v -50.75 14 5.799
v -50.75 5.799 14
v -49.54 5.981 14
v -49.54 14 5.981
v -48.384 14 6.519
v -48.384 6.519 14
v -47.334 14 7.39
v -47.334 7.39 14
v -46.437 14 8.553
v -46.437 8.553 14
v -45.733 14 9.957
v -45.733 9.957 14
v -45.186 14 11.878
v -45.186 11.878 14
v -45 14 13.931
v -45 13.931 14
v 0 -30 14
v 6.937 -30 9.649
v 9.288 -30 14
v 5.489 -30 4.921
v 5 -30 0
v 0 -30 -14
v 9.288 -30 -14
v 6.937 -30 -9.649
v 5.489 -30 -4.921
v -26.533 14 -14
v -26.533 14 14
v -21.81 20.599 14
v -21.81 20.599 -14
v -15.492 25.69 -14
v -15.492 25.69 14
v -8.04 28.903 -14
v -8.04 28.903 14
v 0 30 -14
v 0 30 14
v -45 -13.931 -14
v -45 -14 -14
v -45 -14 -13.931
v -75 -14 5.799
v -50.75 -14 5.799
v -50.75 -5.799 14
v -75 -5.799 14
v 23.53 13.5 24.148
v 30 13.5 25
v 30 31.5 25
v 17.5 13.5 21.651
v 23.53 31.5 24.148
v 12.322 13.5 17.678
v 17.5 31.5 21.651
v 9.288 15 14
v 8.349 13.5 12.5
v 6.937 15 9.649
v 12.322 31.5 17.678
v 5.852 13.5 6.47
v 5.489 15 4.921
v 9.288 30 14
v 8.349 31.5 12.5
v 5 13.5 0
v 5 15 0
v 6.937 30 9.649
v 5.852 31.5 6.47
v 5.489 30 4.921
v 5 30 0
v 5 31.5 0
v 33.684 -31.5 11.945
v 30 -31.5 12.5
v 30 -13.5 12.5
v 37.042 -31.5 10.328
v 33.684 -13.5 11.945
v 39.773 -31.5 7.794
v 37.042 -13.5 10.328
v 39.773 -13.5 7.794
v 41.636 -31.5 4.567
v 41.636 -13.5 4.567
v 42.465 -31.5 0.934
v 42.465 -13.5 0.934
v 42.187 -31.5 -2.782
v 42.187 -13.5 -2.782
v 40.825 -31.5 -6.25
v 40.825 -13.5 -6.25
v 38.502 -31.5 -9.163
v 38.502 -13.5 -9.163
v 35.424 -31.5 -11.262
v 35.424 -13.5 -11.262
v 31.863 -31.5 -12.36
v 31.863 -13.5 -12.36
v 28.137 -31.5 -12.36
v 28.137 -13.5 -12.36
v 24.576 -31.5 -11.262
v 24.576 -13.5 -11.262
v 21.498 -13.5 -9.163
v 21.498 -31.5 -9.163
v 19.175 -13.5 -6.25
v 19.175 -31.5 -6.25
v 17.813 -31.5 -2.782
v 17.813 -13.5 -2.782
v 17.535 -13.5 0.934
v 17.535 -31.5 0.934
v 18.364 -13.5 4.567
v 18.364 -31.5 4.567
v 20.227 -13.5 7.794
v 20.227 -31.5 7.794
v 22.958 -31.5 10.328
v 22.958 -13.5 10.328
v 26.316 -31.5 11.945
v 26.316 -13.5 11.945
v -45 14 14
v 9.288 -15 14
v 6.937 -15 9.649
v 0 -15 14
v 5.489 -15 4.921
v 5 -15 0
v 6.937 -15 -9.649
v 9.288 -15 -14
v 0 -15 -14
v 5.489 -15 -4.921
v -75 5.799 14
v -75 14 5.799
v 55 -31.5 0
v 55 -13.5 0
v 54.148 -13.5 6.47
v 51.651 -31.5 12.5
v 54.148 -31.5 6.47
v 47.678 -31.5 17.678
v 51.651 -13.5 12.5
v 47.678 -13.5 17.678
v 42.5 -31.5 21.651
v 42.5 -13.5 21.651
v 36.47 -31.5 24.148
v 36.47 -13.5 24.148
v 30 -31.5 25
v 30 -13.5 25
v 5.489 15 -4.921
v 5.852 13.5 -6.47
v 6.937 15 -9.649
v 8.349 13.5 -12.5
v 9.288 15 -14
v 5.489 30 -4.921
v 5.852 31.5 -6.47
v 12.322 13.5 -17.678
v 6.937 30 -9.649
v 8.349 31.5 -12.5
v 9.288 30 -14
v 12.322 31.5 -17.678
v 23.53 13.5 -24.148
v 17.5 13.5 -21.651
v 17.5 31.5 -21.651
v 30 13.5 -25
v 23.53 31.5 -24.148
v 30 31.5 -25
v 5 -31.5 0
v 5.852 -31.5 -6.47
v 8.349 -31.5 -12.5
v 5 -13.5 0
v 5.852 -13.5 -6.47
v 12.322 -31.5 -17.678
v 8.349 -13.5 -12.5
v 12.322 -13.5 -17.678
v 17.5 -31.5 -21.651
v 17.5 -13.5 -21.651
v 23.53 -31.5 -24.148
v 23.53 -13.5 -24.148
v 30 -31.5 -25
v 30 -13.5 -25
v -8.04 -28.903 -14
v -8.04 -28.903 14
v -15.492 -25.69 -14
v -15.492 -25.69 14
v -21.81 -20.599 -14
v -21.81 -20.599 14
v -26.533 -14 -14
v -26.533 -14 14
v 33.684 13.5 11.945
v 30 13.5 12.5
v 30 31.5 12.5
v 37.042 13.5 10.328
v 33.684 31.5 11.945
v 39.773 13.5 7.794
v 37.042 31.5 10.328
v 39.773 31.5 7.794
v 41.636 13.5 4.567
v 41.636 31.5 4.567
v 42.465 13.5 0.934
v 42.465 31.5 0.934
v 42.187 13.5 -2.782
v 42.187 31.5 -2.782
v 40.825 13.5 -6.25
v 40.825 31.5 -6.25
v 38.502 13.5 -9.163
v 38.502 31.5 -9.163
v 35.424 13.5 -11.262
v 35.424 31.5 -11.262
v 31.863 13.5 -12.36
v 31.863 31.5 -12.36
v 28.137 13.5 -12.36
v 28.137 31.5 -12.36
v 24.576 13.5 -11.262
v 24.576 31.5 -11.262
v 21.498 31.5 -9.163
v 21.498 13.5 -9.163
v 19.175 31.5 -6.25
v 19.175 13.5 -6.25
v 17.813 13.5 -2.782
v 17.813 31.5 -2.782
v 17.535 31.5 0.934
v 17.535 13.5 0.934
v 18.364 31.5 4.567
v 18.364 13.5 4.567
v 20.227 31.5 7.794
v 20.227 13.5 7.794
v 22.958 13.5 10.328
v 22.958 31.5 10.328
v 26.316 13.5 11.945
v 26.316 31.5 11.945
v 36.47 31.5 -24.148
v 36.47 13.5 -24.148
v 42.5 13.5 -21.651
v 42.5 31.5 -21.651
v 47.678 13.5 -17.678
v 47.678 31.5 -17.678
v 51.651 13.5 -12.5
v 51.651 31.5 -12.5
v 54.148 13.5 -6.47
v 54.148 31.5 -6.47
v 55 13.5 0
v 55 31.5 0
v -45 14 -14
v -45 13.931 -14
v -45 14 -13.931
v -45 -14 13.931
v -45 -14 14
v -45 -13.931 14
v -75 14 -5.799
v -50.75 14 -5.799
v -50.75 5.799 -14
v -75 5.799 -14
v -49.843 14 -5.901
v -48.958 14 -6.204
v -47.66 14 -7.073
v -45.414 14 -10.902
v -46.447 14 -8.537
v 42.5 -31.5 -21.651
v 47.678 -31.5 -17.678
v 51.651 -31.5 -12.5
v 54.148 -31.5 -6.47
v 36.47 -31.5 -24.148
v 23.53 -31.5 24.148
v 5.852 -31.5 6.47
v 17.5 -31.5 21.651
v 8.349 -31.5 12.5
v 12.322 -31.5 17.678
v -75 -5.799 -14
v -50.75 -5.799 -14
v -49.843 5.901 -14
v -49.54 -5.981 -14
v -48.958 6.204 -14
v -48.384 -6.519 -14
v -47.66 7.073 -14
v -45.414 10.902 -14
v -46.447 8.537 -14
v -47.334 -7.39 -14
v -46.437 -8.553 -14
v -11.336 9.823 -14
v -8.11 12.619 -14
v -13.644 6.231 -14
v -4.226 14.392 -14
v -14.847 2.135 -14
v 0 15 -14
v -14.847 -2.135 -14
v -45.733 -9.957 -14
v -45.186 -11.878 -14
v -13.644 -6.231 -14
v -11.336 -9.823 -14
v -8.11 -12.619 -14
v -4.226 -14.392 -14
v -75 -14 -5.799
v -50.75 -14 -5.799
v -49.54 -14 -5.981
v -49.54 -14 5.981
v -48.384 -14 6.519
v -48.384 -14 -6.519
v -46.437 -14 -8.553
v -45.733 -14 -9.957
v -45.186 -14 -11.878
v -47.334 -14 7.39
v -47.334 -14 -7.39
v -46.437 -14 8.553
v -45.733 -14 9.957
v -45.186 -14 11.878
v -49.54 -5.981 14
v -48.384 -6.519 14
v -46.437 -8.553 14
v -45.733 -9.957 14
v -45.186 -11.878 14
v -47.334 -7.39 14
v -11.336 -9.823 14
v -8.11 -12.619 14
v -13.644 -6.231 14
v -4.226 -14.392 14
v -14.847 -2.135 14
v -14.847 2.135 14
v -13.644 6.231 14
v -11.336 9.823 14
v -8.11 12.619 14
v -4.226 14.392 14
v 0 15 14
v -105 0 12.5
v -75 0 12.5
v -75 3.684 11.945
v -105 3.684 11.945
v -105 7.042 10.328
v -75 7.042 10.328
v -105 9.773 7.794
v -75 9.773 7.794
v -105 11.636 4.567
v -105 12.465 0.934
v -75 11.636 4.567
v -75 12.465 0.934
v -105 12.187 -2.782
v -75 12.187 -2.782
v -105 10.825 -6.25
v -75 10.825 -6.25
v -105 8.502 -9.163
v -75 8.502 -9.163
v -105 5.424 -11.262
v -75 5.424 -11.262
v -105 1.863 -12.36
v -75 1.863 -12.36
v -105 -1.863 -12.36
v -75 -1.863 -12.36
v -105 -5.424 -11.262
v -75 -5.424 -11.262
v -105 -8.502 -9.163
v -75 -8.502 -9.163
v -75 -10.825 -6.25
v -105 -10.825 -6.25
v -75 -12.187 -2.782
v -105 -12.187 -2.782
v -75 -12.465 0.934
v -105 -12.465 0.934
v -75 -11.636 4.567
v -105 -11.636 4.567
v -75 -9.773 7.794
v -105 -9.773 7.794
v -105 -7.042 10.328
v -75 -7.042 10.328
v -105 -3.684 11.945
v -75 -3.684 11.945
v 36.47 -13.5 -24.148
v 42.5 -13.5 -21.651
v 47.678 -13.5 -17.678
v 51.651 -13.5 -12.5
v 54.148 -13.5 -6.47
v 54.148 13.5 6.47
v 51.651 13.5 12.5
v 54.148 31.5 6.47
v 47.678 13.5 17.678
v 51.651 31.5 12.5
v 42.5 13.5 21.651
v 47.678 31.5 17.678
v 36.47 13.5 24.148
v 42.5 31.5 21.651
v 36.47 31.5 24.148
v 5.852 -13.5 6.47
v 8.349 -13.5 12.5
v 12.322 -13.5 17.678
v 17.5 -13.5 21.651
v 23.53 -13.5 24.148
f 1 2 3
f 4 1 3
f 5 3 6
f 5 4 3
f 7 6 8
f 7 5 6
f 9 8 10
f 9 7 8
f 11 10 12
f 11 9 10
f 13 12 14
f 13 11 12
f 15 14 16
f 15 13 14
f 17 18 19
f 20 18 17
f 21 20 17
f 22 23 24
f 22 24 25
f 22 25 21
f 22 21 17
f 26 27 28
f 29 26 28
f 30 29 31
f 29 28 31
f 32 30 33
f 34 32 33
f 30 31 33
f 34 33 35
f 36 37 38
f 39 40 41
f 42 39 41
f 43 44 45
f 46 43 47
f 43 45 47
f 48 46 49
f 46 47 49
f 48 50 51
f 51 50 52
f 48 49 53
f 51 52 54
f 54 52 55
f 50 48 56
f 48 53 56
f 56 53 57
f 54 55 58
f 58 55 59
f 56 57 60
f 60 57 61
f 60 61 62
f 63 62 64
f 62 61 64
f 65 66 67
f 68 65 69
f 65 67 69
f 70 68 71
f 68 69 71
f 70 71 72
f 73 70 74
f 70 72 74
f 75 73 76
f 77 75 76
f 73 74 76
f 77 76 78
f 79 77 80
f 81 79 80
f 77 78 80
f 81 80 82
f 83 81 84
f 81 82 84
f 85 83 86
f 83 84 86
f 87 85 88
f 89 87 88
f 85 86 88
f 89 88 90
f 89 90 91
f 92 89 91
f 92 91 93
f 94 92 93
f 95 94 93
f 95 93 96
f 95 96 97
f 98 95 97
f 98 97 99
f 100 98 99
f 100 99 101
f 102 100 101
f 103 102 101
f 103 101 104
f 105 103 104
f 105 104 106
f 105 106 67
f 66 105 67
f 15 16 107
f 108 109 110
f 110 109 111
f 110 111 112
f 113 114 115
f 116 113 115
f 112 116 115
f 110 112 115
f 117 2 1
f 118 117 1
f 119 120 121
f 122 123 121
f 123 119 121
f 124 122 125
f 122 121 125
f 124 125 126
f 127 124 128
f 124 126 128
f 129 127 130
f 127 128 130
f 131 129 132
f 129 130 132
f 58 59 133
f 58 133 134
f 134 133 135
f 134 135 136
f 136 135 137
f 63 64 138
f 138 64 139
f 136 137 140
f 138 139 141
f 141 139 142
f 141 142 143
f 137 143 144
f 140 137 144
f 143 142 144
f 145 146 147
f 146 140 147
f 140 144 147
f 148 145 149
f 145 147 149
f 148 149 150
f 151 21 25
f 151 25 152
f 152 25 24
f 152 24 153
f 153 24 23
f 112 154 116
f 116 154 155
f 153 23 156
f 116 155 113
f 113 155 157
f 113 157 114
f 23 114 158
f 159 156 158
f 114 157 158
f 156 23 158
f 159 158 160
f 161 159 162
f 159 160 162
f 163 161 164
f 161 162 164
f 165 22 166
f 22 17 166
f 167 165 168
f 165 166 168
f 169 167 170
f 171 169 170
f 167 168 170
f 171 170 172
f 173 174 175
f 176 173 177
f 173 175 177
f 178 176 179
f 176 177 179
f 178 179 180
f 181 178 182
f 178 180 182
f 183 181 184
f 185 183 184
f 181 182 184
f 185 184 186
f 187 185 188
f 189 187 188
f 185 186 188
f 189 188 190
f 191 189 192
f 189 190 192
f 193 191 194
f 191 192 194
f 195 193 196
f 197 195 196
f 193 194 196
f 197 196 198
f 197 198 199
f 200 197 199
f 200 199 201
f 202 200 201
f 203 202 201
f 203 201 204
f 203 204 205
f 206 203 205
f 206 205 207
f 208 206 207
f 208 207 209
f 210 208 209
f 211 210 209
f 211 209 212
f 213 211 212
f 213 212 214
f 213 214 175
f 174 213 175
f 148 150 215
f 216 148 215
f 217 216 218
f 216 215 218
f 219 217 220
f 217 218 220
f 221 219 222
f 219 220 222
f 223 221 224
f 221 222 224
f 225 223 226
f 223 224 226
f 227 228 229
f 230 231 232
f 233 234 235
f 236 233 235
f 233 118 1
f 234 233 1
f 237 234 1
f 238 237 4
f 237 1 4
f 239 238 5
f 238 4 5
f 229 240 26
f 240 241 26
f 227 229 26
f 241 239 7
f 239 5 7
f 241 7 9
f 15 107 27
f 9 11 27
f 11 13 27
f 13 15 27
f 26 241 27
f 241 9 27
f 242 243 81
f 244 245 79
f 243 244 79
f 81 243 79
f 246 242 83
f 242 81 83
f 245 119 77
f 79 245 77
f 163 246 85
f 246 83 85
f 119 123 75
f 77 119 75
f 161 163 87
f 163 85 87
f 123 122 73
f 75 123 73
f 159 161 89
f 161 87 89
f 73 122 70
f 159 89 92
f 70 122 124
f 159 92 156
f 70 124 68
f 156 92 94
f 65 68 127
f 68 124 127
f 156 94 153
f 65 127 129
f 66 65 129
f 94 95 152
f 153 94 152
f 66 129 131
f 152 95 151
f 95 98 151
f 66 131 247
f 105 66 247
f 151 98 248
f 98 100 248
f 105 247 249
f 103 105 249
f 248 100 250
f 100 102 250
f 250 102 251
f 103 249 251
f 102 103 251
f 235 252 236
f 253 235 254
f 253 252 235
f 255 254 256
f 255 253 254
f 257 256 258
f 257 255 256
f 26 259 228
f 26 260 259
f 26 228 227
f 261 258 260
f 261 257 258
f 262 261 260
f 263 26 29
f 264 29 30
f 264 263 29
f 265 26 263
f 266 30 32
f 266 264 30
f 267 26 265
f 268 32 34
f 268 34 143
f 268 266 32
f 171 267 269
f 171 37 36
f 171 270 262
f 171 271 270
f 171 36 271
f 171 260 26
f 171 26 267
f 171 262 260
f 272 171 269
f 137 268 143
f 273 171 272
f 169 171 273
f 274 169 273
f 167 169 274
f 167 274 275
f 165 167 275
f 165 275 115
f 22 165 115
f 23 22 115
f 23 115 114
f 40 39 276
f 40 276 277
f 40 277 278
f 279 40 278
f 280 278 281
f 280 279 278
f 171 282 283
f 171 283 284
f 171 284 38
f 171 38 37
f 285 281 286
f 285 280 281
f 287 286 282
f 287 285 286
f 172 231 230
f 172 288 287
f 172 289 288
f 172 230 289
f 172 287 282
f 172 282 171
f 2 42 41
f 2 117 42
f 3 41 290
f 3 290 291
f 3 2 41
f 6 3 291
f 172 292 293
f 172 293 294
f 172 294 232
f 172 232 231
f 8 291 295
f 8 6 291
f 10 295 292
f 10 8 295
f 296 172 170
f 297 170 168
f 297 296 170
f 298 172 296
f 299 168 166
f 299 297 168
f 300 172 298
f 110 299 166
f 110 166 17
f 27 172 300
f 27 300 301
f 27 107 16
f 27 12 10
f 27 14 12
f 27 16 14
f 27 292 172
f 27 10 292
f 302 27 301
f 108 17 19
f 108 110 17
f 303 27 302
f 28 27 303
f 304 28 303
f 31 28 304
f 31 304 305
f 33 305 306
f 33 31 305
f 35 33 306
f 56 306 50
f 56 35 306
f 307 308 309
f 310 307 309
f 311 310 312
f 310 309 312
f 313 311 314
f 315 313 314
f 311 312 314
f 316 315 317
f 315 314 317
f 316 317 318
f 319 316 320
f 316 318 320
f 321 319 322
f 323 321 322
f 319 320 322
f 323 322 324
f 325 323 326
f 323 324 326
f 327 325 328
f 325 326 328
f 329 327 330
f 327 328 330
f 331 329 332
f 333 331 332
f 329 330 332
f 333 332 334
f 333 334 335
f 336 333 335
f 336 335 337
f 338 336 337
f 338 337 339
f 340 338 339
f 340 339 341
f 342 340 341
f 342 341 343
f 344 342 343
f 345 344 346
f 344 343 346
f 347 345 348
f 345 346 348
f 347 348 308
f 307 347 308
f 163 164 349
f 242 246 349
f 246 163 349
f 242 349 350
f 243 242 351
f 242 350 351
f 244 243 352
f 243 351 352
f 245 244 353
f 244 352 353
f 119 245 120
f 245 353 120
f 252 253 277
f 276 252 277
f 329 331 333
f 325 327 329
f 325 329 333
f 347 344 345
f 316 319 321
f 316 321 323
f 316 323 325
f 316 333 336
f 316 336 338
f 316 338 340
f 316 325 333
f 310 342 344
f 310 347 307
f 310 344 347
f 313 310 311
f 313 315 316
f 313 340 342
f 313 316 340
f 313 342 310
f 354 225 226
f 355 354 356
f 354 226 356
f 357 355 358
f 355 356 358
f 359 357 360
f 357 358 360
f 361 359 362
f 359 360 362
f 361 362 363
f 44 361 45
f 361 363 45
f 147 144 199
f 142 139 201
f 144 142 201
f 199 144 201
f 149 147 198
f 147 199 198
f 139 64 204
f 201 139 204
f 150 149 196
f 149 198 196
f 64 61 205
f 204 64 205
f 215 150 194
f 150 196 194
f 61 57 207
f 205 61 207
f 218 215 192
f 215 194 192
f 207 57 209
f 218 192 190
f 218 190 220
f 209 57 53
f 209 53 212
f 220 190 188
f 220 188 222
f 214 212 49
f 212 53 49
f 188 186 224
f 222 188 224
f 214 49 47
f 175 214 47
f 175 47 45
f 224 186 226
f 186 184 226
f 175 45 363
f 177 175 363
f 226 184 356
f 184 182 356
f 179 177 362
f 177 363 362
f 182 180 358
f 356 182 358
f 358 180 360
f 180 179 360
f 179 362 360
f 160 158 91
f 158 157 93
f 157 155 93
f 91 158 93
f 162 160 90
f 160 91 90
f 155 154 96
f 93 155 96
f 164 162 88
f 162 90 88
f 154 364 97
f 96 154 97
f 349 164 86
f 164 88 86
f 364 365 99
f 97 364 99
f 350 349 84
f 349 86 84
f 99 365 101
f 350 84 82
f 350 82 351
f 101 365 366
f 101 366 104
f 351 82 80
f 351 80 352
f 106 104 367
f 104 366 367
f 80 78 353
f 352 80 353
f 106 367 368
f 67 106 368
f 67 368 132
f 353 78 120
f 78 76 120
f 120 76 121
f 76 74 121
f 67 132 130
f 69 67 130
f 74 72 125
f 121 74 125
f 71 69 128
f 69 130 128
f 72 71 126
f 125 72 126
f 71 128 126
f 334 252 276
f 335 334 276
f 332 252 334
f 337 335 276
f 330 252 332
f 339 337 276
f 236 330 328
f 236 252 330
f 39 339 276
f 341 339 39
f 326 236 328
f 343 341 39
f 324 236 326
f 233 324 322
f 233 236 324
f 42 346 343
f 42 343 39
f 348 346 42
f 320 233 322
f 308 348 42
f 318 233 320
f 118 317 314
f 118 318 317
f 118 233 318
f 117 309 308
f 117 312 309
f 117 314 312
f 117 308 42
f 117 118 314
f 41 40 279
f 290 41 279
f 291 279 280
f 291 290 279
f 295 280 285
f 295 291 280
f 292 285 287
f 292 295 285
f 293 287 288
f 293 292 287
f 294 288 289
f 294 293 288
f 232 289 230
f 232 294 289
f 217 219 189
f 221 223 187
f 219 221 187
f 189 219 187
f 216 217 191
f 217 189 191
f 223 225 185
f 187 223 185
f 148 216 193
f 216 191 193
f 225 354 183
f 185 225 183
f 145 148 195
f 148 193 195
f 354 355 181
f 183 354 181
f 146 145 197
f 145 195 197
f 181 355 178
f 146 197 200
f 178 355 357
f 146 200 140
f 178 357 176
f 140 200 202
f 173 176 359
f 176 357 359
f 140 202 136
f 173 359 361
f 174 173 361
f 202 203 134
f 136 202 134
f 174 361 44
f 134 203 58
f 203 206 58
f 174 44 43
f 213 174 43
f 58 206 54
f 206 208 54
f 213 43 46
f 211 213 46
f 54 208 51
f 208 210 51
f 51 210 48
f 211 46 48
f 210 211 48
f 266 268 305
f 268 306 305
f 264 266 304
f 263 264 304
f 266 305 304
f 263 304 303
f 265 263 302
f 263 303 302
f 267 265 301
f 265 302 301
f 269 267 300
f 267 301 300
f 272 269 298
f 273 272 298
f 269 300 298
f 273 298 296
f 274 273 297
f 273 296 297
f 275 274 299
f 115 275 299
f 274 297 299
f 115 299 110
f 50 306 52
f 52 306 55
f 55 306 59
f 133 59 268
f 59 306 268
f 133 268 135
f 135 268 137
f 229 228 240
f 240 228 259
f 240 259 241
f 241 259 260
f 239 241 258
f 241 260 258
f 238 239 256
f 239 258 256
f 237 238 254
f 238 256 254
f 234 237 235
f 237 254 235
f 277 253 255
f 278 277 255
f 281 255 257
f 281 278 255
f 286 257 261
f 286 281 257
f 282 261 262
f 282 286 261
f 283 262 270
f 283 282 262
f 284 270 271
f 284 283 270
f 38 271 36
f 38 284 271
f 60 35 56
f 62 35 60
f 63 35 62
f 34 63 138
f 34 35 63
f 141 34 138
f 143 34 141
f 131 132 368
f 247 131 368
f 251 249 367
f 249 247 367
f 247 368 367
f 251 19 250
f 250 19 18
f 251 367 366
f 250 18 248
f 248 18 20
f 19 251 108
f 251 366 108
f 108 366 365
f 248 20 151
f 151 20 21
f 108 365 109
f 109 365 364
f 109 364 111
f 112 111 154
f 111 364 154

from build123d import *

# Parameters (mm, degrees)
SKETCH1_W             = 50
SKETCH1_H             = 18
BOSS_EXTRUDE1_DEPTH   = 25
BOSS_EXTRUDE1_2_DEPTH = 25
BOSS_EXTRUDE2_DEPTH   = 14
SKETCH1_5_W           = 18.467001677
SKETCH1_5_H           = 28
BOSS_EXTRUDE3_DEPTH   = 14
SKETCH2_R             = 12.5
CUT_EXTRUDE1_DEPTH    = 98
CUT_EXTRUDE2_DEPTH    = 98
BOSS_EXTRUDE4_DEPTH   = 15
BOSS_EXTRUDE5_DEPTH   = 15
BOSS_EXTRUDE6_DEPTH   = 30
FILLET1_R             = 5.75
FILLET2_R             = 5.75
FILLET3_R             = 5.75
FILLET4_R             = 5.75
SKETCH9_R             = 12.5
BOSS_EXTRUDE7_DEPTH   = 30


with BuildPart() as part:
    # Sketch1 → Boss-Extrude1 (new, symmetric)
    with BuildSketch(Plane.XY):
        with Locations((30, 22.5)):
            Rectangle(SKETCH1_W, SKETCH1_H)
    extrude(amount=BOSS_EXTRUDE1_DEPTH, both=True)



with BuildPart() as body_2:
    # Sketch1 → Boss-Extrude1 2 (new, symmetric)
    with BuildSketch(Plane.XY):
        with Locations((30, -22.5)):
            Rectangle(SKETCH1_W, SKETCH1_H)
    extrude(amount=BOSS_EXTRUDE1_2_DEPTH, both=True)


with BuildPart() as part_1:
    add(part.part)

    add(body_2.part)  # Boss-Extrude2 merges body 2
    # Sketch1<4> → Boss-Extrude2 (add, symmetric)
    with BuildSketch(Plane.XY):
        with BuildLine():
            Line((5, 15), (5, 30))
            Line((5, 30), (0, 30))
            ThreePointArc((0, 30), (-15.491933385, 25.690465157), (-26.532998323, 14))
            Line((-26.532998323, 14), (-26.532998323, -14))
            ThreePointArc((-26.532998323, -14), (-15.491933385, -25.690465157), (0, -30))
            Line((0, -30), (5, -30))
            Line((5, -30), (5, -15))
            Line((5, -15), (0, -15))
            ThreePointArc((0, -15), (-15, 0), (0, 15))
            Line((0, 15), (5, 15))
        make_face()
    extrude(amount=BOSS_EXTRUDE2_DEPTH, both=True)

    # Sketch1<5> → Boss-Extrude3 (add, symmetric)
    with BuildSketch(Plane.XY):
        with Locations((-35.766499162, 0)):
            Rectangle(SKETCH1_5_W, SKETCH1_5_H)
    extrude(amount=BOSS_EXTRUDE3_DEPTH, both=True)

    # Sketch2 → Cut-Extrude1 (cut)
    with BuildSketch(Plane(origin=(0, 31.5, 0), x_dir=(1, 0, 0), z_dir=(0, 1, 0))):
        with Locations((30, 0)):
            Circle(SKETCH2_R)
    extrude(amount=-CUT_EXTRUDE1_DEPTH, mode=Mode.SUBTRACT)

    # Sketch3 → Cut-Extrude2 (cut)
    with BuildSketch(Plane(origin=(0, 31.5, 0), x_dir=(1, 0, 0), z_dir=(0, 1, 0))):
        with BuildLine():
            Line((5, -2.5e-08), (5, -25))
            Line((5, -25), (30, -25))
            ThreePointArc((30, -25), (12.322330479, -17.677669538), (5, -2.5e-08))
        make_face()
        with BuildLine():
            Line((5, 25), (5, -2.5e-08))
            ThreePointArc((5, -2.5e-08), (12.322330462, 17.677669521), (30, 25))
            Line((30, 25), (5, 25))
        make_face()
        with BuildLine():
            ThreePointArc((55, 0), (47.67766953, -17.67766953), (30, -25))
            Line((30, -25), (55, -25))
            Line((55, -25), (55, 0))
        make_face()
        with BuildLine():
            Line((55, 25), (30, 25))
            ThreePointArc((30, 25), (47.67766953, 17.67766953), (55, 0))
            Line((55, 0), (55, 25))
        make_face()
    extrude(amount=-CUT_EXTRUDE2_DEPTH, mode=Mode.SUBTRACT)


with BuildPart() as cut_extrude2_piece_1:
    # of the separate pieces the step leaves, piece 1, a body of its own (cut_extrude2_pieces)
    add(part_1.part.solids().sort_by_distance((5, -15, -14))[0])



with BuildPart() as cut_extrude2_piece_2:
    # of the separate pieces the step leaves, piece 2, a body of its own (cut_extrude2_pieces)
    add(part_1.part.solids().sort_by_distance((30, -13.5, -25))[0])


with BuildPart() as cut_extrude2_piece_3:
    # of the separate pieces the step leaves, piece 3, a body of its own (cut_extrude2_pieces)
    add(part_1.part.solids().sort_by_distance((5, 31.5, 2.5e-08))[0])


with BuildPart() as cut_extrude2_piece_1_1:
    add(cut_extrude2_piece_1.part)

    add(cut_extrude2_piece_3.part)  # Boss-Extrude4 merges Cut-Extrude2 piece 3
    # Sketch6 → Boss-Extrude4 (add)
    with BuildSketch(Plane(origin=(0, 30, 0), x_dir=(1, 0, 0), z_dir=(0, 1, 0))):
        with BuildLine():
            ThreePointArc((9.287684823, -14), (6.095943024, -7.320933008), (5, 2.6e-08))
            Line((5, 2.6e-08), (5, -14))
            Line((5, -14), (9.287684823, -14))
        make_face()
        with BuildLine():
            Line((9.287684823, 14), (5, 14))
            Line((5, 14), (5, 2.6e-08))
            ThreePointArc((5, 2.6e-08), (6.095943032, 7.320933033), (9.287684823, 14))
        make_face()
    extrude(amount=-BOSS_EXTRUDE4_DEPTH)


    add(cut_extrude2_piece_2.part)  # Boss-Extrude5 merges Cut-Extrude2 piece 2
    # Sketch7 → Boss-Extrude5 (add)
    with BuildSketch(Plane(origin=(0, -30, 0), x_dir=(-1, 0, 0), z_dir=(0, -1, 0))):
        with BuildLine():
            Line((-5, 0), (-5, 14))
            Line((-5, 14), (-9.287684823, 14))
            ThreePointArc((-9.287684823, 14), (-6.095943028, 7.32093302), (-5, 0))
        make_face()
        with BuildLine():
            Line((-5, -14), (-5, 0))
            ThreePointArc((-5, 0), (-6.095943028, -7.32093302), (-9.287684823, -14))
            Line((-9.287684823, -14), (-5, -14))
        make_face()
    extrude(amount=-BOSS_EXTRUDE5_DEPTH)

    # Sketch8 → Boss-Extrude6 (add)
    with BuildSketch(Plane.ZY.offset(45)):
        Polygon((5.798989873, 14), (-5.798989873, 14), (-14, 5.798989873), (-14, -5.798989873), (-5.798989873, -14), (5.798989873, -14), (14, -5.798989873), (14, 5.798989873), align=None)
    extrude(amount=BOSS_EXTRUDE6_DEPTH)

    # Fillet1
    fillet1_edges = [cut_extrude2_piece_1_1.edges().sort_by_distance(p)[0] for p in [
        (-45, 9.899494937, -9.899494937),
    ]]
    fillet(fillet1_edges, radius=FILLET1_R)

    # Fillet2
    fillet2_edges = [cut_extrude2_piece_1_1.edges().sort_by_distance(p)[0] for p in [
        (-45, 9.899494937, 9.899494937),
    ]]
    fillet(fillet2_edges, radius=FILLET2_R)

    # Fillet3
    fillet3_edges = [cut_extrude2_piece_1_1.edges().sort_by_distance(p)[0] for p in [
        (-45, -9.899494937, -9.899494937),
    ]]
    fillet(fillet3_edges, radius=FILLET3_R)

    # Fillet4
    fillet4_edges = [cut_extrude2_piece_1_1.edges().sort_by_distance(p)[0] for p in [
        (-45, -9.899494937, 9.899494937),
    ]]
    fillet(fillet4_edges, radius=FILLET4_R)

    # Sketch9 → Boss-Extrude7 (add)
    with BuildSketch(Plane.ZY.offset(75)):
        Circle(SKETCH9_R)
    extrude(amount=BOSS_EXTRUDE7_DEPTH)


solid = cut_extrude2_piece_1_1.part
